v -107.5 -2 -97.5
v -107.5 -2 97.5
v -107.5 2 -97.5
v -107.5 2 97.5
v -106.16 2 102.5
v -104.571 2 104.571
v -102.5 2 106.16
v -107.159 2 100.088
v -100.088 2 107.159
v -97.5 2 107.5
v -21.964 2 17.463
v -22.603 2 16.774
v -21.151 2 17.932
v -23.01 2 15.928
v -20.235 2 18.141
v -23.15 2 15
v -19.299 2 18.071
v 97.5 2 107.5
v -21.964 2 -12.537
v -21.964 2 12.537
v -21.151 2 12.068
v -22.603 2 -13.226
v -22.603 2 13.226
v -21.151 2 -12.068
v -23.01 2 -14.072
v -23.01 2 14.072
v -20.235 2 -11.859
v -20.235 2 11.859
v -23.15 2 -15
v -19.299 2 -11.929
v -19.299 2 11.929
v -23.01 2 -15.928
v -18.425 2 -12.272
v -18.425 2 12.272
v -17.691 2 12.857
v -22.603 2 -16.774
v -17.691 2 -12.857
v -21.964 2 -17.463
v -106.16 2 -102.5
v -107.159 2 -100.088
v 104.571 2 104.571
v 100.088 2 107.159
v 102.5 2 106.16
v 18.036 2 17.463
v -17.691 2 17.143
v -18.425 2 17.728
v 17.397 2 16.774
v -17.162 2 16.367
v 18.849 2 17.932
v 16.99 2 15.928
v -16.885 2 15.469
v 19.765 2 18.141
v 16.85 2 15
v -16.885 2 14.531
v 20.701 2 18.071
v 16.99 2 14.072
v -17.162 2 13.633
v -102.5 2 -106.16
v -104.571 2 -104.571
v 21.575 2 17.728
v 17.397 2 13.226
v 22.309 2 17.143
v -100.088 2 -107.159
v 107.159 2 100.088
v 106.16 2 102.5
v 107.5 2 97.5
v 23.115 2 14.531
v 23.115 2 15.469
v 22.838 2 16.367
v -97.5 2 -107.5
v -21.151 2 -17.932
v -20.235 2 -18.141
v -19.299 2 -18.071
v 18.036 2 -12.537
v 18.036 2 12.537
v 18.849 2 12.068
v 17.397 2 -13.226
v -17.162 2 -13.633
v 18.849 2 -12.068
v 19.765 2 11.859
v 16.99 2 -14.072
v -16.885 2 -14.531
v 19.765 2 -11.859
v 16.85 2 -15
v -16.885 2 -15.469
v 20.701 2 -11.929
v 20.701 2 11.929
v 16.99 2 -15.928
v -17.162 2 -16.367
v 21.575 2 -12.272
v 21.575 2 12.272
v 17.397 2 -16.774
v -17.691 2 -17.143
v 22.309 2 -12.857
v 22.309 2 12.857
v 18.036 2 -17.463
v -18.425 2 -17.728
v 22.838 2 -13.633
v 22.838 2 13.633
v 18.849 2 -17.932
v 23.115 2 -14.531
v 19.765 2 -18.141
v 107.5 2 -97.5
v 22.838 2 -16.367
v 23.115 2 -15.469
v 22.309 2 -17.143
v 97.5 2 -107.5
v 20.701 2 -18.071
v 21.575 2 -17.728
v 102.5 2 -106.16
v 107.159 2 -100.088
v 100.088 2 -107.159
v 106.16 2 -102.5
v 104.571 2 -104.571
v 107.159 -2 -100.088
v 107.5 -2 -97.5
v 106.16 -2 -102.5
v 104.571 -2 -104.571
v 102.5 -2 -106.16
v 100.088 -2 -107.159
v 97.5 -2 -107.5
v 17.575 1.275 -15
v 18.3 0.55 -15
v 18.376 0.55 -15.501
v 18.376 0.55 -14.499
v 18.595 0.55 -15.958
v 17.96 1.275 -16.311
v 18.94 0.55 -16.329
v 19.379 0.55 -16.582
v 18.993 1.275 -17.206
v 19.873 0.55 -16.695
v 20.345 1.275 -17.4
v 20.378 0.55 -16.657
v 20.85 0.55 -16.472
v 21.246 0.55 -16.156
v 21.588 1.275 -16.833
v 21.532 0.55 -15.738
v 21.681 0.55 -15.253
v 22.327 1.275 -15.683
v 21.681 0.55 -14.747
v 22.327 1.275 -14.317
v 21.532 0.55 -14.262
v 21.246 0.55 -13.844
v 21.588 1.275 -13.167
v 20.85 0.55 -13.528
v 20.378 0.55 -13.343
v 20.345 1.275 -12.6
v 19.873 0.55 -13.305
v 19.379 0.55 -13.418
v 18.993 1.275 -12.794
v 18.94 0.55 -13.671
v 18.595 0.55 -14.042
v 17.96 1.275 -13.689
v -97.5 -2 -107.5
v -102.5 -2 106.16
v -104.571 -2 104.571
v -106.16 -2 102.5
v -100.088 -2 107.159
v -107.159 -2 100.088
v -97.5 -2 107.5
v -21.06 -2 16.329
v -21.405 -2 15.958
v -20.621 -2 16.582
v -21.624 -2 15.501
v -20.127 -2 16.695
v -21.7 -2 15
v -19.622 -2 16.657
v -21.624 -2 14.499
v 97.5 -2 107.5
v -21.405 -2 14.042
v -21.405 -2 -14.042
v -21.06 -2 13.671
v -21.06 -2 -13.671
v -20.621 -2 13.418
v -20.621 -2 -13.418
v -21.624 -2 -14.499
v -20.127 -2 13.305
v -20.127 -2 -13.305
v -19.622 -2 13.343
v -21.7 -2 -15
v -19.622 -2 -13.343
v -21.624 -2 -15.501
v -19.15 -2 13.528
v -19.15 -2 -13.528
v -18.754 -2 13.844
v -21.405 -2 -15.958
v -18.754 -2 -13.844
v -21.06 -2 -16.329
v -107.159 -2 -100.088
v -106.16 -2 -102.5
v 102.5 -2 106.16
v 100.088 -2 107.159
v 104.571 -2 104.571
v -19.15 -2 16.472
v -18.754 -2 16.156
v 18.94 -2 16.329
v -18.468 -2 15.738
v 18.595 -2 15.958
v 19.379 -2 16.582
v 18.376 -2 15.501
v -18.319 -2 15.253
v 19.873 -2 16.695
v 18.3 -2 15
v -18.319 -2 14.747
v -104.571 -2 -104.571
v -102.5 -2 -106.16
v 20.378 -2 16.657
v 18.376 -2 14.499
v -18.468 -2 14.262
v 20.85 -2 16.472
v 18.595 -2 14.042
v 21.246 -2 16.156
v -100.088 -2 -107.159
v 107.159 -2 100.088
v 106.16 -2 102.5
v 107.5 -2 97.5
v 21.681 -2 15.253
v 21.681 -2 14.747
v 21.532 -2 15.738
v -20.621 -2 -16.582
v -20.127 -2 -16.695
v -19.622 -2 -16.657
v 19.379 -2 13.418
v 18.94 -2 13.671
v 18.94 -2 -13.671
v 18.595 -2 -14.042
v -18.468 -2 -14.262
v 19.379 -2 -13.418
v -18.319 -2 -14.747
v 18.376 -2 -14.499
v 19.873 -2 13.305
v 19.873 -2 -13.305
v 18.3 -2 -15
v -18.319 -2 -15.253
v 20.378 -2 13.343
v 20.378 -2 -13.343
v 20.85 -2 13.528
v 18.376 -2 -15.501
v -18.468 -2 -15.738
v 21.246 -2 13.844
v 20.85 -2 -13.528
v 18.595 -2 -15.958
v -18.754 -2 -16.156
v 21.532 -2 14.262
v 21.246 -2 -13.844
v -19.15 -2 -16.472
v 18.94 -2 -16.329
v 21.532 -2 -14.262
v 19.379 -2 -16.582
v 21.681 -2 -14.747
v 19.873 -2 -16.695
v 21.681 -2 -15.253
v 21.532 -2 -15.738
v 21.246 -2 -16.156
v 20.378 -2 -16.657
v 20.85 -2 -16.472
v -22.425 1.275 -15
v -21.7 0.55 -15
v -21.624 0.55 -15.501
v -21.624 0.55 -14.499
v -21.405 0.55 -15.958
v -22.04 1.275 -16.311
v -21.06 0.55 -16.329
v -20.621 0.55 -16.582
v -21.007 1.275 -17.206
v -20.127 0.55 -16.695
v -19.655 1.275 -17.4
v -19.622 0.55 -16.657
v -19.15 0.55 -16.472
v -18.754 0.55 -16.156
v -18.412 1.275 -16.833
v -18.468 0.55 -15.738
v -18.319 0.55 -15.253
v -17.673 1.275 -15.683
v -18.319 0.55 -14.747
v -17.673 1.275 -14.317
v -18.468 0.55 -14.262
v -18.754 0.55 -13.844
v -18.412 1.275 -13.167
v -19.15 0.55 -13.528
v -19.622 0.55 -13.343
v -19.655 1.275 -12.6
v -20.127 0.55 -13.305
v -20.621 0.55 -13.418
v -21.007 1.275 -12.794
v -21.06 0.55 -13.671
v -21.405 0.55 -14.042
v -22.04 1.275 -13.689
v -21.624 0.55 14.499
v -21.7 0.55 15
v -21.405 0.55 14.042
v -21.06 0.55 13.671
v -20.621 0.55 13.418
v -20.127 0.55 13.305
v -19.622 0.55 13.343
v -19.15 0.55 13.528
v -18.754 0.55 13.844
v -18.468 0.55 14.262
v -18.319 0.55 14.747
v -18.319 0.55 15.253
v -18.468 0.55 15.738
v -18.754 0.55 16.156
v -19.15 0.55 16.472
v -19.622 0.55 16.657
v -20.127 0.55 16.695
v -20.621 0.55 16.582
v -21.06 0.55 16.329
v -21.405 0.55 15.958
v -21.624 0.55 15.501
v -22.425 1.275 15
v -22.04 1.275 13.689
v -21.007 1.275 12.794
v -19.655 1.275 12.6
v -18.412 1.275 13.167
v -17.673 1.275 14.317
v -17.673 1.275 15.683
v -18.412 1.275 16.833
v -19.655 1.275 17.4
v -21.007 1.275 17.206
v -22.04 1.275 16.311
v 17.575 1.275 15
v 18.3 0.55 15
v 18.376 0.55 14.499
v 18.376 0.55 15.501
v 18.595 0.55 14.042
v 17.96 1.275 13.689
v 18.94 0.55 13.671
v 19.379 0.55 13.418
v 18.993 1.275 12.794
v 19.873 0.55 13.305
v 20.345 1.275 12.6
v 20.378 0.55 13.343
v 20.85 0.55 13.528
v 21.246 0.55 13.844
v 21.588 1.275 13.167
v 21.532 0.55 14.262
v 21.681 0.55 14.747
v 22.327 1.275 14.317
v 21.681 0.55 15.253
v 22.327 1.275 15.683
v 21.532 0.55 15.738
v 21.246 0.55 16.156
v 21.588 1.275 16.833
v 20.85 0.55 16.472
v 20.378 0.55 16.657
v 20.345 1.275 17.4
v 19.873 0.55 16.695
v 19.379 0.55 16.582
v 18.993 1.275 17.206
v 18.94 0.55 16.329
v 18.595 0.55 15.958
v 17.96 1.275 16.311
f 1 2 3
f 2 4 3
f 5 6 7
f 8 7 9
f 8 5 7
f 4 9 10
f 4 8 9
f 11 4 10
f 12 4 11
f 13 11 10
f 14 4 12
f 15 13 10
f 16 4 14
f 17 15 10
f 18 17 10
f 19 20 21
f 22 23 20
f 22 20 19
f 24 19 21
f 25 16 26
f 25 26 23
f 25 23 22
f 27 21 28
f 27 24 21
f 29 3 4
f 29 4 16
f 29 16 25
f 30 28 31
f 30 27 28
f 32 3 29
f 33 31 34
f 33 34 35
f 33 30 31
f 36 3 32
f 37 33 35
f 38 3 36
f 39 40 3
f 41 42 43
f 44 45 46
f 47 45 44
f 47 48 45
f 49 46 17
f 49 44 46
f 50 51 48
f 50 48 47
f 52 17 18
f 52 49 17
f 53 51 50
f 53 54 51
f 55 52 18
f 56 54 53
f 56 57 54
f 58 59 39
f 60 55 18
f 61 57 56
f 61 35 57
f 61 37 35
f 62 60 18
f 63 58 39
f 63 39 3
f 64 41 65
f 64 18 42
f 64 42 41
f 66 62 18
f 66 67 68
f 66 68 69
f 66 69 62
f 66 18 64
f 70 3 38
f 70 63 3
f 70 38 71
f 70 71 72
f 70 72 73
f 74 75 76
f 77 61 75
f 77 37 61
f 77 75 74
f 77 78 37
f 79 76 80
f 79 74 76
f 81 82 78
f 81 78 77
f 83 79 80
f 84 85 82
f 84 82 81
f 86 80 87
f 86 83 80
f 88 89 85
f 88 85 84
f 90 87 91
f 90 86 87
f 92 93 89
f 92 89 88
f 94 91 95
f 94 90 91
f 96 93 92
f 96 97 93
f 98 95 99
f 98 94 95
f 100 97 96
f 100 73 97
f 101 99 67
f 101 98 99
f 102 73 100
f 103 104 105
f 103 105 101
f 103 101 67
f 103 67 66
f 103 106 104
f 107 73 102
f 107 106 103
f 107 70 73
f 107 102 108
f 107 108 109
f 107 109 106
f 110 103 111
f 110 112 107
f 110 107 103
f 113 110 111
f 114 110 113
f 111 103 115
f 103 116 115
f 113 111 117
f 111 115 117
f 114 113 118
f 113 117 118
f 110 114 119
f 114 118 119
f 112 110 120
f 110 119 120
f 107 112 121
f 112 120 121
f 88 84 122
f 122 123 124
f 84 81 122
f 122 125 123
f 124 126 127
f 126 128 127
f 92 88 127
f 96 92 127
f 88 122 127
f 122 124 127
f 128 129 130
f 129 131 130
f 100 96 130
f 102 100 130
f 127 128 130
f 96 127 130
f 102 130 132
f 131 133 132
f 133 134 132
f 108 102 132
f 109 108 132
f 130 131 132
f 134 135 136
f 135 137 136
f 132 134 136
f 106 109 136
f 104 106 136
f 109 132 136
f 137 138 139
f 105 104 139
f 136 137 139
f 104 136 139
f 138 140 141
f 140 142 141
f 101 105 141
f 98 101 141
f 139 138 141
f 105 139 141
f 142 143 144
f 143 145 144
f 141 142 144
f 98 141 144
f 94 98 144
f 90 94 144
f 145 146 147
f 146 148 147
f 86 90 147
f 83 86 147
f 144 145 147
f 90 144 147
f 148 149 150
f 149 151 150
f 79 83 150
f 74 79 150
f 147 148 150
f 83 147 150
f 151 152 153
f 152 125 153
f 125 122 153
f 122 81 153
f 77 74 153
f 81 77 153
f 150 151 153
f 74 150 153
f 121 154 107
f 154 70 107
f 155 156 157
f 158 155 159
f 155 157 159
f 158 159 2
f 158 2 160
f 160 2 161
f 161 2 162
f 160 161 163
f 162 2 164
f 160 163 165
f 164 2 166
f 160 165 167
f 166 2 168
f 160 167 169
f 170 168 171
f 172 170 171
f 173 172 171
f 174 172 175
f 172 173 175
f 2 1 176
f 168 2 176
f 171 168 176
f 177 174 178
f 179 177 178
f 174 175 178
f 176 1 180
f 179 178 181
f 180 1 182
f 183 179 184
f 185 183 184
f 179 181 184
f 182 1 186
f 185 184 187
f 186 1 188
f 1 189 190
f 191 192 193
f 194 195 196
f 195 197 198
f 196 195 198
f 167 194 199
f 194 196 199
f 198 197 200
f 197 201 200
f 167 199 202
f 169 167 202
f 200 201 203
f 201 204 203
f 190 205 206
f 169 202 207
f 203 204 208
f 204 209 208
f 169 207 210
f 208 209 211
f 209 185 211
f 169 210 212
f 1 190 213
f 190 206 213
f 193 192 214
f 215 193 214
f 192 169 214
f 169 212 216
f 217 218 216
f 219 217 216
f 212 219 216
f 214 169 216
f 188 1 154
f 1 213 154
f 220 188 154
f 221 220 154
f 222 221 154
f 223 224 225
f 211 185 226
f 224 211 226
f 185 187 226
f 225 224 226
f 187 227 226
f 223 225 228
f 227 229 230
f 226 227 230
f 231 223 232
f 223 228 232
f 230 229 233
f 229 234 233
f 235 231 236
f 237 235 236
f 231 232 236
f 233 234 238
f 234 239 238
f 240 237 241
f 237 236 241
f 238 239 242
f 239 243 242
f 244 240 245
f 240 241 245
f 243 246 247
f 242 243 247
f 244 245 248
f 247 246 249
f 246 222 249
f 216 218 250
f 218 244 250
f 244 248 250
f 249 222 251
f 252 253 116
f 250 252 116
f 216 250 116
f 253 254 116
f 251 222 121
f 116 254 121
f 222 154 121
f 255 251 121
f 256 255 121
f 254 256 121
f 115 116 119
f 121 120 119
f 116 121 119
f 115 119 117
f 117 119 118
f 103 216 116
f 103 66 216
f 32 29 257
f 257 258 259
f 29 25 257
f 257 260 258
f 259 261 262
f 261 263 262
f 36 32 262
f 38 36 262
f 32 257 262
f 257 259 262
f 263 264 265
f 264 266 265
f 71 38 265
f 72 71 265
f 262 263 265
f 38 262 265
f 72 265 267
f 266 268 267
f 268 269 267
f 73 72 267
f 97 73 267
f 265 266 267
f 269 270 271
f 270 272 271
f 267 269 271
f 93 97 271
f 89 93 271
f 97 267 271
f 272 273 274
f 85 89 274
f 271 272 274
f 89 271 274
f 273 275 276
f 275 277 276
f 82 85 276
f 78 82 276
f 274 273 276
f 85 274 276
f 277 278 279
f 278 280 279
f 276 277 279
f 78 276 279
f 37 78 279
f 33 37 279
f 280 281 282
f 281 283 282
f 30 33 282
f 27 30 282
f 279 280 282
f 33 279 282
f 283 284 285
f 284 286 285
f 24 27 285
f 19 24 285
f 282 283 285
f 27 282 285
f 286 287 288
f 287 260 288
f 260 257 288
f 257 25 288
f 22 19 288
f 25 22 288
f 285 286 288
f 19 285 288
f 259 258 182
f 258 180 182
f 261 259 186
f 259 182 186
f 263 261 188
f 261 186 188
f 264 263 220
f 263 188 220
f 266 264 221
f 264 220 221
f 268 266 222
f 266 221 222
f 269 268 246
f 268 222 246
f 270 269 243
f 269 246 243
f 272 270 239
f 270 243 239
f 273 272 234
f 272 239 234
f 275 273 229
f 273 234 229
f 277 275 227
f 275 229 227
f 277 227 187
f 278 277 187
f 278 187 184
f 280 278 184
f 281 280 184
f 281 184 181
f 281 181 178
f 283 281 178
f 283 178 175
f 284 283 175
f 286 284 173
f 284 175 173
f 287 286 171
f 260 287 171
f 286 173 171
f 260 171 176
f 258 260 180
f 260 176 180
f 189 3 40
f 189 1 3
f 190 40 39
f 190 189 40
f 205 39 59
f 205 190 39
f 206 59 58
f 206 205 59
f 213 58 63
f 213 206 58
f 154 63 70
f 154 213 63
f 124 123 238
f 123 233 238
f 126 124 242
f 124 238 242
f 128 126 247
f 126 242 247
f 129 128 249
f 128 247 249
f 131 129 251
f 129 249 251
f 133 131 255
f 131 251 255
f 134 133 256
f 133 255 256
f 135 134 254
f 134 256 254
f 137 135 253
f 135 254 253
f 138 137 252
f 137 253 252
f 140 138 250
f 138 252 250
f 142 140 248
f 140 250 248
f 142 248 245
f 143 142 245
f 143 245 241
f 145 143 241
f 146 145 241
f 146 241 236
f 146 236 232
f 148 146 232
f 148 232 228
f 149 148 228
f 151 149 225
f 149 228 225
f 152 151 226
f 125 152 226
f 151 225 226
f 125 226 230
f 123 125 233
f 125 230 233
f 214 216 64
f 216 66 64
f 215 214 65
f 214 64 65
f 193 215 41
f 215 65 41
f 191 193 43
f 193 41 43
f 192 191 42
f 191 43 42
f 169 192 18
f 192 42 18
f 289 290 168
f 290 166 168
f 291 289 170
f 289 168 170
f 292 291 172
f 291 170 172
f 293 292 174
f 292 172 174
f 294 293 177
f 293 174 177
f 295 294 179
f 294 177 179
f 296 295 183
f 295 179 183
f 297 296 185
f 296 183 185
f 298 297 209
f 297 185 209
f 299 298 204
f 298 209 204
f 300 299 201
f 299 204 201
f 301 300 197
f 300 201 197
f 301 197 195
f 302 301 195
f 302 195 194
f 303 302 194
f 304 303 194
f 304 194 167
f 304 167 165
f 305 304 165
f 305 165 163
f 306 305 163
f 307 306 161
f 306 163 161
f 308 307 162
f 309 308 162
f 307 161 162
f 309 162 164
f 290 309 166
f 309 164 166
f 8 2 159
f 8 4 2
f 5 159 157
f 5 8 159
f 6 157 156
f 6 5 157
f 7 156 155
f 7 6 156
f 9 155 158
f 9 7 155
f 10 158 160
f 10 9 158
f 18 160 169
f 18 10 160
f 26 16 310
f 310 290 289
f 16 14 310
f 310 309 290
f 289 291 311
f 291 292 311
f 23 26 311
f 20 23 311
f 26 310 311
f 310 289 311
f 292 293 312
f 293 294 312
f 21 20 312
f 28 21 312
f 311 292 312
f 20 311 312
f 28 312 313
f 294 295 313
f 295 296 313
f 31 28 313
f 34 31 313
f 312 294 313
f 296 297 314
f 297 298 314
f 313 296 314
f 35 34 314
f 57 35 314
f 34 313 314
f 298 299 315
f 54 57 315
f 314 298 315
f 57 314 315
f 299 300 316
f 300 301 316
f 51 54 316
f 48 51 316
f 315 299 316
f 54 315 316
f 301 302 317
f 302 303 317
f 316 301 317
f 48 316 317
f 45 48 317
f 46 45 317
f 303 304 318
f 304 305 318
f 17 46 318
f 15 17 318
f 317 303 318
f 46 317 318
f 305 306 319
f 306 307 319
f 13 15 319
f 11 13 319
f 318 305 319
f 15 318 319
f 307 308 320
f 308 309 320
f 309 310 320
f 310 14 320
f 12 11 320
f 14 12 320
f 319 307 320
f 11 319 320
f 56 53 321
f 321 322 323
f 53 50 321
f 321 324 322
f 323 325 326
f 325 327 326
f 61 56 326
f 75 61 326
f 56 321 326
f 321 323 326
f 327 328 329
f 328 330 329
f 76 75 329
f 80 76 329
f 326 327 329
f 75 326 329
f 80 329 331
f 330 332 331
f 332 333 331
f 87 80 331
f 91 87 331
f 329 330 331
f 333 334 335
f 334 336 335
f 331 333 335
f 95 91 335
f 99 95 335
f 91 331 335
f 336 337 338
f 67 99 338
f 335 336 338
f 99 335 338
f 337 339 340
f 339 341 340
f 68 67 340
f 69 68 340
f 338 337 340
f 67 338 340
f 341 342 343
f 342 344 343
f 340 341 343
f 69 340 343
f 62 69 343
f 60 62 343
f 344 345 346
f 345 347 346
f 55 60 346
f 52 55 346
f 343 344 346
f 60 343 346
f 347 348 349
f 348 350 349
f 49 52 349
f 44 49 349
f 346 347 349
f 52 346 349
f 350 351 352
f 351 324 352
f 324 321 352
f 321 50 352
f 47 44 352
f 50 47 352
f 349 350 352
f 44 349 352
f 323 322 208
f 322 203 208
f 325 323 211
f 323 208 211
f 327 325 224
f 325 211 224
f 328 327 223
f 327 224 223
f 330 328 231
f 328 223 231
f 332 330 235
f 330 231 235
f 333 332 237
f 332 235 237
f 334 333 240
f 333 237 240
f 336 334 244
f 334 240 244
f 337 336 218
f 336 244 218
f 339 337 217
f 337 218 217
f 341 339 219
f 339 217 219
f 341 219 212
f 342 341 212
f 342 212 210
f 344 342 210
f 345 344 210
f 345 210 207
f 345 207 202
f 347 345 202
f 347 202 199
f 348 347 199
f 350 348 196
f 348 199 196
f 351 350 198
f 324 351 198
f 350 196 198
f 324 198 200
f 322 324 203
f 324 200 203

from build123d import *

# Parameters (mm, degrees)
SKETCH1_W                                       = 215
SKETCH1_H                                       = 215
BOSS_EXTRUDE1_DEPTH                             = 2
CSK_FOR_M3_FLAT_HEAD_MACHINE_SCREW1_D           = 3.4
CSK_FOR_M3_FLAT_HEAD_MACHINE_SCREW1_CSINK_D     = 6.3
CSK_FOR_M3_FLAT_HEAD_MACHINE_SCREW1_CSINK_ANGLE = 90
FILLET1_R                                       = 10


with BuildPart() as part:
    # Sketch1 → Boss-Extrude1 (new, symmetric)
    with BuildSketch(Plane(origin=(0, 0, 0), x_dir=(1, 0, 0), z_dir=(0, 1, 0))):
        Rectangle(SKETCH1_W, SKETCH1_H)
    extrude(amount=BOSS_EXTRUDE1_DEPTH, both=True)

    # CSK for M3 Flat Head Machine Screw1 (through all)
    with Locations(Plane(origin=(0, 2, 0), x_dir=(1, 0, 0), z_dir=(0, 1, 0))):
        with Locations((-20, 15), (20, 15), (20, -15), (-20, -15)):
            CounterSinkHole(CSK_FOR_M3_FLAT_HEAD_MACHINE_SCREW1_D / 2, CSK_FOR_M3_FLAT_HEAD_MACHINE_SCREW1_CSINK_D / 2, counter_sink_angle=CSK_FOR_M3_FLAT_HEAD_MACHINE_SCREW1_CSINK_ANGLE)

    # Fillet1
    fillet1_edges = [part.edges().sort_by_distance(p)[0] for p in [
        (107.5, 0, 107.5),
        (-107.5, 0, 107.5),
        (-107.5, 0, -107.5),
        (107.5, 0, -107.5),
    ]]
    fillet(fillet1_edges, radius=FILLET1_R)


solid = part.part
